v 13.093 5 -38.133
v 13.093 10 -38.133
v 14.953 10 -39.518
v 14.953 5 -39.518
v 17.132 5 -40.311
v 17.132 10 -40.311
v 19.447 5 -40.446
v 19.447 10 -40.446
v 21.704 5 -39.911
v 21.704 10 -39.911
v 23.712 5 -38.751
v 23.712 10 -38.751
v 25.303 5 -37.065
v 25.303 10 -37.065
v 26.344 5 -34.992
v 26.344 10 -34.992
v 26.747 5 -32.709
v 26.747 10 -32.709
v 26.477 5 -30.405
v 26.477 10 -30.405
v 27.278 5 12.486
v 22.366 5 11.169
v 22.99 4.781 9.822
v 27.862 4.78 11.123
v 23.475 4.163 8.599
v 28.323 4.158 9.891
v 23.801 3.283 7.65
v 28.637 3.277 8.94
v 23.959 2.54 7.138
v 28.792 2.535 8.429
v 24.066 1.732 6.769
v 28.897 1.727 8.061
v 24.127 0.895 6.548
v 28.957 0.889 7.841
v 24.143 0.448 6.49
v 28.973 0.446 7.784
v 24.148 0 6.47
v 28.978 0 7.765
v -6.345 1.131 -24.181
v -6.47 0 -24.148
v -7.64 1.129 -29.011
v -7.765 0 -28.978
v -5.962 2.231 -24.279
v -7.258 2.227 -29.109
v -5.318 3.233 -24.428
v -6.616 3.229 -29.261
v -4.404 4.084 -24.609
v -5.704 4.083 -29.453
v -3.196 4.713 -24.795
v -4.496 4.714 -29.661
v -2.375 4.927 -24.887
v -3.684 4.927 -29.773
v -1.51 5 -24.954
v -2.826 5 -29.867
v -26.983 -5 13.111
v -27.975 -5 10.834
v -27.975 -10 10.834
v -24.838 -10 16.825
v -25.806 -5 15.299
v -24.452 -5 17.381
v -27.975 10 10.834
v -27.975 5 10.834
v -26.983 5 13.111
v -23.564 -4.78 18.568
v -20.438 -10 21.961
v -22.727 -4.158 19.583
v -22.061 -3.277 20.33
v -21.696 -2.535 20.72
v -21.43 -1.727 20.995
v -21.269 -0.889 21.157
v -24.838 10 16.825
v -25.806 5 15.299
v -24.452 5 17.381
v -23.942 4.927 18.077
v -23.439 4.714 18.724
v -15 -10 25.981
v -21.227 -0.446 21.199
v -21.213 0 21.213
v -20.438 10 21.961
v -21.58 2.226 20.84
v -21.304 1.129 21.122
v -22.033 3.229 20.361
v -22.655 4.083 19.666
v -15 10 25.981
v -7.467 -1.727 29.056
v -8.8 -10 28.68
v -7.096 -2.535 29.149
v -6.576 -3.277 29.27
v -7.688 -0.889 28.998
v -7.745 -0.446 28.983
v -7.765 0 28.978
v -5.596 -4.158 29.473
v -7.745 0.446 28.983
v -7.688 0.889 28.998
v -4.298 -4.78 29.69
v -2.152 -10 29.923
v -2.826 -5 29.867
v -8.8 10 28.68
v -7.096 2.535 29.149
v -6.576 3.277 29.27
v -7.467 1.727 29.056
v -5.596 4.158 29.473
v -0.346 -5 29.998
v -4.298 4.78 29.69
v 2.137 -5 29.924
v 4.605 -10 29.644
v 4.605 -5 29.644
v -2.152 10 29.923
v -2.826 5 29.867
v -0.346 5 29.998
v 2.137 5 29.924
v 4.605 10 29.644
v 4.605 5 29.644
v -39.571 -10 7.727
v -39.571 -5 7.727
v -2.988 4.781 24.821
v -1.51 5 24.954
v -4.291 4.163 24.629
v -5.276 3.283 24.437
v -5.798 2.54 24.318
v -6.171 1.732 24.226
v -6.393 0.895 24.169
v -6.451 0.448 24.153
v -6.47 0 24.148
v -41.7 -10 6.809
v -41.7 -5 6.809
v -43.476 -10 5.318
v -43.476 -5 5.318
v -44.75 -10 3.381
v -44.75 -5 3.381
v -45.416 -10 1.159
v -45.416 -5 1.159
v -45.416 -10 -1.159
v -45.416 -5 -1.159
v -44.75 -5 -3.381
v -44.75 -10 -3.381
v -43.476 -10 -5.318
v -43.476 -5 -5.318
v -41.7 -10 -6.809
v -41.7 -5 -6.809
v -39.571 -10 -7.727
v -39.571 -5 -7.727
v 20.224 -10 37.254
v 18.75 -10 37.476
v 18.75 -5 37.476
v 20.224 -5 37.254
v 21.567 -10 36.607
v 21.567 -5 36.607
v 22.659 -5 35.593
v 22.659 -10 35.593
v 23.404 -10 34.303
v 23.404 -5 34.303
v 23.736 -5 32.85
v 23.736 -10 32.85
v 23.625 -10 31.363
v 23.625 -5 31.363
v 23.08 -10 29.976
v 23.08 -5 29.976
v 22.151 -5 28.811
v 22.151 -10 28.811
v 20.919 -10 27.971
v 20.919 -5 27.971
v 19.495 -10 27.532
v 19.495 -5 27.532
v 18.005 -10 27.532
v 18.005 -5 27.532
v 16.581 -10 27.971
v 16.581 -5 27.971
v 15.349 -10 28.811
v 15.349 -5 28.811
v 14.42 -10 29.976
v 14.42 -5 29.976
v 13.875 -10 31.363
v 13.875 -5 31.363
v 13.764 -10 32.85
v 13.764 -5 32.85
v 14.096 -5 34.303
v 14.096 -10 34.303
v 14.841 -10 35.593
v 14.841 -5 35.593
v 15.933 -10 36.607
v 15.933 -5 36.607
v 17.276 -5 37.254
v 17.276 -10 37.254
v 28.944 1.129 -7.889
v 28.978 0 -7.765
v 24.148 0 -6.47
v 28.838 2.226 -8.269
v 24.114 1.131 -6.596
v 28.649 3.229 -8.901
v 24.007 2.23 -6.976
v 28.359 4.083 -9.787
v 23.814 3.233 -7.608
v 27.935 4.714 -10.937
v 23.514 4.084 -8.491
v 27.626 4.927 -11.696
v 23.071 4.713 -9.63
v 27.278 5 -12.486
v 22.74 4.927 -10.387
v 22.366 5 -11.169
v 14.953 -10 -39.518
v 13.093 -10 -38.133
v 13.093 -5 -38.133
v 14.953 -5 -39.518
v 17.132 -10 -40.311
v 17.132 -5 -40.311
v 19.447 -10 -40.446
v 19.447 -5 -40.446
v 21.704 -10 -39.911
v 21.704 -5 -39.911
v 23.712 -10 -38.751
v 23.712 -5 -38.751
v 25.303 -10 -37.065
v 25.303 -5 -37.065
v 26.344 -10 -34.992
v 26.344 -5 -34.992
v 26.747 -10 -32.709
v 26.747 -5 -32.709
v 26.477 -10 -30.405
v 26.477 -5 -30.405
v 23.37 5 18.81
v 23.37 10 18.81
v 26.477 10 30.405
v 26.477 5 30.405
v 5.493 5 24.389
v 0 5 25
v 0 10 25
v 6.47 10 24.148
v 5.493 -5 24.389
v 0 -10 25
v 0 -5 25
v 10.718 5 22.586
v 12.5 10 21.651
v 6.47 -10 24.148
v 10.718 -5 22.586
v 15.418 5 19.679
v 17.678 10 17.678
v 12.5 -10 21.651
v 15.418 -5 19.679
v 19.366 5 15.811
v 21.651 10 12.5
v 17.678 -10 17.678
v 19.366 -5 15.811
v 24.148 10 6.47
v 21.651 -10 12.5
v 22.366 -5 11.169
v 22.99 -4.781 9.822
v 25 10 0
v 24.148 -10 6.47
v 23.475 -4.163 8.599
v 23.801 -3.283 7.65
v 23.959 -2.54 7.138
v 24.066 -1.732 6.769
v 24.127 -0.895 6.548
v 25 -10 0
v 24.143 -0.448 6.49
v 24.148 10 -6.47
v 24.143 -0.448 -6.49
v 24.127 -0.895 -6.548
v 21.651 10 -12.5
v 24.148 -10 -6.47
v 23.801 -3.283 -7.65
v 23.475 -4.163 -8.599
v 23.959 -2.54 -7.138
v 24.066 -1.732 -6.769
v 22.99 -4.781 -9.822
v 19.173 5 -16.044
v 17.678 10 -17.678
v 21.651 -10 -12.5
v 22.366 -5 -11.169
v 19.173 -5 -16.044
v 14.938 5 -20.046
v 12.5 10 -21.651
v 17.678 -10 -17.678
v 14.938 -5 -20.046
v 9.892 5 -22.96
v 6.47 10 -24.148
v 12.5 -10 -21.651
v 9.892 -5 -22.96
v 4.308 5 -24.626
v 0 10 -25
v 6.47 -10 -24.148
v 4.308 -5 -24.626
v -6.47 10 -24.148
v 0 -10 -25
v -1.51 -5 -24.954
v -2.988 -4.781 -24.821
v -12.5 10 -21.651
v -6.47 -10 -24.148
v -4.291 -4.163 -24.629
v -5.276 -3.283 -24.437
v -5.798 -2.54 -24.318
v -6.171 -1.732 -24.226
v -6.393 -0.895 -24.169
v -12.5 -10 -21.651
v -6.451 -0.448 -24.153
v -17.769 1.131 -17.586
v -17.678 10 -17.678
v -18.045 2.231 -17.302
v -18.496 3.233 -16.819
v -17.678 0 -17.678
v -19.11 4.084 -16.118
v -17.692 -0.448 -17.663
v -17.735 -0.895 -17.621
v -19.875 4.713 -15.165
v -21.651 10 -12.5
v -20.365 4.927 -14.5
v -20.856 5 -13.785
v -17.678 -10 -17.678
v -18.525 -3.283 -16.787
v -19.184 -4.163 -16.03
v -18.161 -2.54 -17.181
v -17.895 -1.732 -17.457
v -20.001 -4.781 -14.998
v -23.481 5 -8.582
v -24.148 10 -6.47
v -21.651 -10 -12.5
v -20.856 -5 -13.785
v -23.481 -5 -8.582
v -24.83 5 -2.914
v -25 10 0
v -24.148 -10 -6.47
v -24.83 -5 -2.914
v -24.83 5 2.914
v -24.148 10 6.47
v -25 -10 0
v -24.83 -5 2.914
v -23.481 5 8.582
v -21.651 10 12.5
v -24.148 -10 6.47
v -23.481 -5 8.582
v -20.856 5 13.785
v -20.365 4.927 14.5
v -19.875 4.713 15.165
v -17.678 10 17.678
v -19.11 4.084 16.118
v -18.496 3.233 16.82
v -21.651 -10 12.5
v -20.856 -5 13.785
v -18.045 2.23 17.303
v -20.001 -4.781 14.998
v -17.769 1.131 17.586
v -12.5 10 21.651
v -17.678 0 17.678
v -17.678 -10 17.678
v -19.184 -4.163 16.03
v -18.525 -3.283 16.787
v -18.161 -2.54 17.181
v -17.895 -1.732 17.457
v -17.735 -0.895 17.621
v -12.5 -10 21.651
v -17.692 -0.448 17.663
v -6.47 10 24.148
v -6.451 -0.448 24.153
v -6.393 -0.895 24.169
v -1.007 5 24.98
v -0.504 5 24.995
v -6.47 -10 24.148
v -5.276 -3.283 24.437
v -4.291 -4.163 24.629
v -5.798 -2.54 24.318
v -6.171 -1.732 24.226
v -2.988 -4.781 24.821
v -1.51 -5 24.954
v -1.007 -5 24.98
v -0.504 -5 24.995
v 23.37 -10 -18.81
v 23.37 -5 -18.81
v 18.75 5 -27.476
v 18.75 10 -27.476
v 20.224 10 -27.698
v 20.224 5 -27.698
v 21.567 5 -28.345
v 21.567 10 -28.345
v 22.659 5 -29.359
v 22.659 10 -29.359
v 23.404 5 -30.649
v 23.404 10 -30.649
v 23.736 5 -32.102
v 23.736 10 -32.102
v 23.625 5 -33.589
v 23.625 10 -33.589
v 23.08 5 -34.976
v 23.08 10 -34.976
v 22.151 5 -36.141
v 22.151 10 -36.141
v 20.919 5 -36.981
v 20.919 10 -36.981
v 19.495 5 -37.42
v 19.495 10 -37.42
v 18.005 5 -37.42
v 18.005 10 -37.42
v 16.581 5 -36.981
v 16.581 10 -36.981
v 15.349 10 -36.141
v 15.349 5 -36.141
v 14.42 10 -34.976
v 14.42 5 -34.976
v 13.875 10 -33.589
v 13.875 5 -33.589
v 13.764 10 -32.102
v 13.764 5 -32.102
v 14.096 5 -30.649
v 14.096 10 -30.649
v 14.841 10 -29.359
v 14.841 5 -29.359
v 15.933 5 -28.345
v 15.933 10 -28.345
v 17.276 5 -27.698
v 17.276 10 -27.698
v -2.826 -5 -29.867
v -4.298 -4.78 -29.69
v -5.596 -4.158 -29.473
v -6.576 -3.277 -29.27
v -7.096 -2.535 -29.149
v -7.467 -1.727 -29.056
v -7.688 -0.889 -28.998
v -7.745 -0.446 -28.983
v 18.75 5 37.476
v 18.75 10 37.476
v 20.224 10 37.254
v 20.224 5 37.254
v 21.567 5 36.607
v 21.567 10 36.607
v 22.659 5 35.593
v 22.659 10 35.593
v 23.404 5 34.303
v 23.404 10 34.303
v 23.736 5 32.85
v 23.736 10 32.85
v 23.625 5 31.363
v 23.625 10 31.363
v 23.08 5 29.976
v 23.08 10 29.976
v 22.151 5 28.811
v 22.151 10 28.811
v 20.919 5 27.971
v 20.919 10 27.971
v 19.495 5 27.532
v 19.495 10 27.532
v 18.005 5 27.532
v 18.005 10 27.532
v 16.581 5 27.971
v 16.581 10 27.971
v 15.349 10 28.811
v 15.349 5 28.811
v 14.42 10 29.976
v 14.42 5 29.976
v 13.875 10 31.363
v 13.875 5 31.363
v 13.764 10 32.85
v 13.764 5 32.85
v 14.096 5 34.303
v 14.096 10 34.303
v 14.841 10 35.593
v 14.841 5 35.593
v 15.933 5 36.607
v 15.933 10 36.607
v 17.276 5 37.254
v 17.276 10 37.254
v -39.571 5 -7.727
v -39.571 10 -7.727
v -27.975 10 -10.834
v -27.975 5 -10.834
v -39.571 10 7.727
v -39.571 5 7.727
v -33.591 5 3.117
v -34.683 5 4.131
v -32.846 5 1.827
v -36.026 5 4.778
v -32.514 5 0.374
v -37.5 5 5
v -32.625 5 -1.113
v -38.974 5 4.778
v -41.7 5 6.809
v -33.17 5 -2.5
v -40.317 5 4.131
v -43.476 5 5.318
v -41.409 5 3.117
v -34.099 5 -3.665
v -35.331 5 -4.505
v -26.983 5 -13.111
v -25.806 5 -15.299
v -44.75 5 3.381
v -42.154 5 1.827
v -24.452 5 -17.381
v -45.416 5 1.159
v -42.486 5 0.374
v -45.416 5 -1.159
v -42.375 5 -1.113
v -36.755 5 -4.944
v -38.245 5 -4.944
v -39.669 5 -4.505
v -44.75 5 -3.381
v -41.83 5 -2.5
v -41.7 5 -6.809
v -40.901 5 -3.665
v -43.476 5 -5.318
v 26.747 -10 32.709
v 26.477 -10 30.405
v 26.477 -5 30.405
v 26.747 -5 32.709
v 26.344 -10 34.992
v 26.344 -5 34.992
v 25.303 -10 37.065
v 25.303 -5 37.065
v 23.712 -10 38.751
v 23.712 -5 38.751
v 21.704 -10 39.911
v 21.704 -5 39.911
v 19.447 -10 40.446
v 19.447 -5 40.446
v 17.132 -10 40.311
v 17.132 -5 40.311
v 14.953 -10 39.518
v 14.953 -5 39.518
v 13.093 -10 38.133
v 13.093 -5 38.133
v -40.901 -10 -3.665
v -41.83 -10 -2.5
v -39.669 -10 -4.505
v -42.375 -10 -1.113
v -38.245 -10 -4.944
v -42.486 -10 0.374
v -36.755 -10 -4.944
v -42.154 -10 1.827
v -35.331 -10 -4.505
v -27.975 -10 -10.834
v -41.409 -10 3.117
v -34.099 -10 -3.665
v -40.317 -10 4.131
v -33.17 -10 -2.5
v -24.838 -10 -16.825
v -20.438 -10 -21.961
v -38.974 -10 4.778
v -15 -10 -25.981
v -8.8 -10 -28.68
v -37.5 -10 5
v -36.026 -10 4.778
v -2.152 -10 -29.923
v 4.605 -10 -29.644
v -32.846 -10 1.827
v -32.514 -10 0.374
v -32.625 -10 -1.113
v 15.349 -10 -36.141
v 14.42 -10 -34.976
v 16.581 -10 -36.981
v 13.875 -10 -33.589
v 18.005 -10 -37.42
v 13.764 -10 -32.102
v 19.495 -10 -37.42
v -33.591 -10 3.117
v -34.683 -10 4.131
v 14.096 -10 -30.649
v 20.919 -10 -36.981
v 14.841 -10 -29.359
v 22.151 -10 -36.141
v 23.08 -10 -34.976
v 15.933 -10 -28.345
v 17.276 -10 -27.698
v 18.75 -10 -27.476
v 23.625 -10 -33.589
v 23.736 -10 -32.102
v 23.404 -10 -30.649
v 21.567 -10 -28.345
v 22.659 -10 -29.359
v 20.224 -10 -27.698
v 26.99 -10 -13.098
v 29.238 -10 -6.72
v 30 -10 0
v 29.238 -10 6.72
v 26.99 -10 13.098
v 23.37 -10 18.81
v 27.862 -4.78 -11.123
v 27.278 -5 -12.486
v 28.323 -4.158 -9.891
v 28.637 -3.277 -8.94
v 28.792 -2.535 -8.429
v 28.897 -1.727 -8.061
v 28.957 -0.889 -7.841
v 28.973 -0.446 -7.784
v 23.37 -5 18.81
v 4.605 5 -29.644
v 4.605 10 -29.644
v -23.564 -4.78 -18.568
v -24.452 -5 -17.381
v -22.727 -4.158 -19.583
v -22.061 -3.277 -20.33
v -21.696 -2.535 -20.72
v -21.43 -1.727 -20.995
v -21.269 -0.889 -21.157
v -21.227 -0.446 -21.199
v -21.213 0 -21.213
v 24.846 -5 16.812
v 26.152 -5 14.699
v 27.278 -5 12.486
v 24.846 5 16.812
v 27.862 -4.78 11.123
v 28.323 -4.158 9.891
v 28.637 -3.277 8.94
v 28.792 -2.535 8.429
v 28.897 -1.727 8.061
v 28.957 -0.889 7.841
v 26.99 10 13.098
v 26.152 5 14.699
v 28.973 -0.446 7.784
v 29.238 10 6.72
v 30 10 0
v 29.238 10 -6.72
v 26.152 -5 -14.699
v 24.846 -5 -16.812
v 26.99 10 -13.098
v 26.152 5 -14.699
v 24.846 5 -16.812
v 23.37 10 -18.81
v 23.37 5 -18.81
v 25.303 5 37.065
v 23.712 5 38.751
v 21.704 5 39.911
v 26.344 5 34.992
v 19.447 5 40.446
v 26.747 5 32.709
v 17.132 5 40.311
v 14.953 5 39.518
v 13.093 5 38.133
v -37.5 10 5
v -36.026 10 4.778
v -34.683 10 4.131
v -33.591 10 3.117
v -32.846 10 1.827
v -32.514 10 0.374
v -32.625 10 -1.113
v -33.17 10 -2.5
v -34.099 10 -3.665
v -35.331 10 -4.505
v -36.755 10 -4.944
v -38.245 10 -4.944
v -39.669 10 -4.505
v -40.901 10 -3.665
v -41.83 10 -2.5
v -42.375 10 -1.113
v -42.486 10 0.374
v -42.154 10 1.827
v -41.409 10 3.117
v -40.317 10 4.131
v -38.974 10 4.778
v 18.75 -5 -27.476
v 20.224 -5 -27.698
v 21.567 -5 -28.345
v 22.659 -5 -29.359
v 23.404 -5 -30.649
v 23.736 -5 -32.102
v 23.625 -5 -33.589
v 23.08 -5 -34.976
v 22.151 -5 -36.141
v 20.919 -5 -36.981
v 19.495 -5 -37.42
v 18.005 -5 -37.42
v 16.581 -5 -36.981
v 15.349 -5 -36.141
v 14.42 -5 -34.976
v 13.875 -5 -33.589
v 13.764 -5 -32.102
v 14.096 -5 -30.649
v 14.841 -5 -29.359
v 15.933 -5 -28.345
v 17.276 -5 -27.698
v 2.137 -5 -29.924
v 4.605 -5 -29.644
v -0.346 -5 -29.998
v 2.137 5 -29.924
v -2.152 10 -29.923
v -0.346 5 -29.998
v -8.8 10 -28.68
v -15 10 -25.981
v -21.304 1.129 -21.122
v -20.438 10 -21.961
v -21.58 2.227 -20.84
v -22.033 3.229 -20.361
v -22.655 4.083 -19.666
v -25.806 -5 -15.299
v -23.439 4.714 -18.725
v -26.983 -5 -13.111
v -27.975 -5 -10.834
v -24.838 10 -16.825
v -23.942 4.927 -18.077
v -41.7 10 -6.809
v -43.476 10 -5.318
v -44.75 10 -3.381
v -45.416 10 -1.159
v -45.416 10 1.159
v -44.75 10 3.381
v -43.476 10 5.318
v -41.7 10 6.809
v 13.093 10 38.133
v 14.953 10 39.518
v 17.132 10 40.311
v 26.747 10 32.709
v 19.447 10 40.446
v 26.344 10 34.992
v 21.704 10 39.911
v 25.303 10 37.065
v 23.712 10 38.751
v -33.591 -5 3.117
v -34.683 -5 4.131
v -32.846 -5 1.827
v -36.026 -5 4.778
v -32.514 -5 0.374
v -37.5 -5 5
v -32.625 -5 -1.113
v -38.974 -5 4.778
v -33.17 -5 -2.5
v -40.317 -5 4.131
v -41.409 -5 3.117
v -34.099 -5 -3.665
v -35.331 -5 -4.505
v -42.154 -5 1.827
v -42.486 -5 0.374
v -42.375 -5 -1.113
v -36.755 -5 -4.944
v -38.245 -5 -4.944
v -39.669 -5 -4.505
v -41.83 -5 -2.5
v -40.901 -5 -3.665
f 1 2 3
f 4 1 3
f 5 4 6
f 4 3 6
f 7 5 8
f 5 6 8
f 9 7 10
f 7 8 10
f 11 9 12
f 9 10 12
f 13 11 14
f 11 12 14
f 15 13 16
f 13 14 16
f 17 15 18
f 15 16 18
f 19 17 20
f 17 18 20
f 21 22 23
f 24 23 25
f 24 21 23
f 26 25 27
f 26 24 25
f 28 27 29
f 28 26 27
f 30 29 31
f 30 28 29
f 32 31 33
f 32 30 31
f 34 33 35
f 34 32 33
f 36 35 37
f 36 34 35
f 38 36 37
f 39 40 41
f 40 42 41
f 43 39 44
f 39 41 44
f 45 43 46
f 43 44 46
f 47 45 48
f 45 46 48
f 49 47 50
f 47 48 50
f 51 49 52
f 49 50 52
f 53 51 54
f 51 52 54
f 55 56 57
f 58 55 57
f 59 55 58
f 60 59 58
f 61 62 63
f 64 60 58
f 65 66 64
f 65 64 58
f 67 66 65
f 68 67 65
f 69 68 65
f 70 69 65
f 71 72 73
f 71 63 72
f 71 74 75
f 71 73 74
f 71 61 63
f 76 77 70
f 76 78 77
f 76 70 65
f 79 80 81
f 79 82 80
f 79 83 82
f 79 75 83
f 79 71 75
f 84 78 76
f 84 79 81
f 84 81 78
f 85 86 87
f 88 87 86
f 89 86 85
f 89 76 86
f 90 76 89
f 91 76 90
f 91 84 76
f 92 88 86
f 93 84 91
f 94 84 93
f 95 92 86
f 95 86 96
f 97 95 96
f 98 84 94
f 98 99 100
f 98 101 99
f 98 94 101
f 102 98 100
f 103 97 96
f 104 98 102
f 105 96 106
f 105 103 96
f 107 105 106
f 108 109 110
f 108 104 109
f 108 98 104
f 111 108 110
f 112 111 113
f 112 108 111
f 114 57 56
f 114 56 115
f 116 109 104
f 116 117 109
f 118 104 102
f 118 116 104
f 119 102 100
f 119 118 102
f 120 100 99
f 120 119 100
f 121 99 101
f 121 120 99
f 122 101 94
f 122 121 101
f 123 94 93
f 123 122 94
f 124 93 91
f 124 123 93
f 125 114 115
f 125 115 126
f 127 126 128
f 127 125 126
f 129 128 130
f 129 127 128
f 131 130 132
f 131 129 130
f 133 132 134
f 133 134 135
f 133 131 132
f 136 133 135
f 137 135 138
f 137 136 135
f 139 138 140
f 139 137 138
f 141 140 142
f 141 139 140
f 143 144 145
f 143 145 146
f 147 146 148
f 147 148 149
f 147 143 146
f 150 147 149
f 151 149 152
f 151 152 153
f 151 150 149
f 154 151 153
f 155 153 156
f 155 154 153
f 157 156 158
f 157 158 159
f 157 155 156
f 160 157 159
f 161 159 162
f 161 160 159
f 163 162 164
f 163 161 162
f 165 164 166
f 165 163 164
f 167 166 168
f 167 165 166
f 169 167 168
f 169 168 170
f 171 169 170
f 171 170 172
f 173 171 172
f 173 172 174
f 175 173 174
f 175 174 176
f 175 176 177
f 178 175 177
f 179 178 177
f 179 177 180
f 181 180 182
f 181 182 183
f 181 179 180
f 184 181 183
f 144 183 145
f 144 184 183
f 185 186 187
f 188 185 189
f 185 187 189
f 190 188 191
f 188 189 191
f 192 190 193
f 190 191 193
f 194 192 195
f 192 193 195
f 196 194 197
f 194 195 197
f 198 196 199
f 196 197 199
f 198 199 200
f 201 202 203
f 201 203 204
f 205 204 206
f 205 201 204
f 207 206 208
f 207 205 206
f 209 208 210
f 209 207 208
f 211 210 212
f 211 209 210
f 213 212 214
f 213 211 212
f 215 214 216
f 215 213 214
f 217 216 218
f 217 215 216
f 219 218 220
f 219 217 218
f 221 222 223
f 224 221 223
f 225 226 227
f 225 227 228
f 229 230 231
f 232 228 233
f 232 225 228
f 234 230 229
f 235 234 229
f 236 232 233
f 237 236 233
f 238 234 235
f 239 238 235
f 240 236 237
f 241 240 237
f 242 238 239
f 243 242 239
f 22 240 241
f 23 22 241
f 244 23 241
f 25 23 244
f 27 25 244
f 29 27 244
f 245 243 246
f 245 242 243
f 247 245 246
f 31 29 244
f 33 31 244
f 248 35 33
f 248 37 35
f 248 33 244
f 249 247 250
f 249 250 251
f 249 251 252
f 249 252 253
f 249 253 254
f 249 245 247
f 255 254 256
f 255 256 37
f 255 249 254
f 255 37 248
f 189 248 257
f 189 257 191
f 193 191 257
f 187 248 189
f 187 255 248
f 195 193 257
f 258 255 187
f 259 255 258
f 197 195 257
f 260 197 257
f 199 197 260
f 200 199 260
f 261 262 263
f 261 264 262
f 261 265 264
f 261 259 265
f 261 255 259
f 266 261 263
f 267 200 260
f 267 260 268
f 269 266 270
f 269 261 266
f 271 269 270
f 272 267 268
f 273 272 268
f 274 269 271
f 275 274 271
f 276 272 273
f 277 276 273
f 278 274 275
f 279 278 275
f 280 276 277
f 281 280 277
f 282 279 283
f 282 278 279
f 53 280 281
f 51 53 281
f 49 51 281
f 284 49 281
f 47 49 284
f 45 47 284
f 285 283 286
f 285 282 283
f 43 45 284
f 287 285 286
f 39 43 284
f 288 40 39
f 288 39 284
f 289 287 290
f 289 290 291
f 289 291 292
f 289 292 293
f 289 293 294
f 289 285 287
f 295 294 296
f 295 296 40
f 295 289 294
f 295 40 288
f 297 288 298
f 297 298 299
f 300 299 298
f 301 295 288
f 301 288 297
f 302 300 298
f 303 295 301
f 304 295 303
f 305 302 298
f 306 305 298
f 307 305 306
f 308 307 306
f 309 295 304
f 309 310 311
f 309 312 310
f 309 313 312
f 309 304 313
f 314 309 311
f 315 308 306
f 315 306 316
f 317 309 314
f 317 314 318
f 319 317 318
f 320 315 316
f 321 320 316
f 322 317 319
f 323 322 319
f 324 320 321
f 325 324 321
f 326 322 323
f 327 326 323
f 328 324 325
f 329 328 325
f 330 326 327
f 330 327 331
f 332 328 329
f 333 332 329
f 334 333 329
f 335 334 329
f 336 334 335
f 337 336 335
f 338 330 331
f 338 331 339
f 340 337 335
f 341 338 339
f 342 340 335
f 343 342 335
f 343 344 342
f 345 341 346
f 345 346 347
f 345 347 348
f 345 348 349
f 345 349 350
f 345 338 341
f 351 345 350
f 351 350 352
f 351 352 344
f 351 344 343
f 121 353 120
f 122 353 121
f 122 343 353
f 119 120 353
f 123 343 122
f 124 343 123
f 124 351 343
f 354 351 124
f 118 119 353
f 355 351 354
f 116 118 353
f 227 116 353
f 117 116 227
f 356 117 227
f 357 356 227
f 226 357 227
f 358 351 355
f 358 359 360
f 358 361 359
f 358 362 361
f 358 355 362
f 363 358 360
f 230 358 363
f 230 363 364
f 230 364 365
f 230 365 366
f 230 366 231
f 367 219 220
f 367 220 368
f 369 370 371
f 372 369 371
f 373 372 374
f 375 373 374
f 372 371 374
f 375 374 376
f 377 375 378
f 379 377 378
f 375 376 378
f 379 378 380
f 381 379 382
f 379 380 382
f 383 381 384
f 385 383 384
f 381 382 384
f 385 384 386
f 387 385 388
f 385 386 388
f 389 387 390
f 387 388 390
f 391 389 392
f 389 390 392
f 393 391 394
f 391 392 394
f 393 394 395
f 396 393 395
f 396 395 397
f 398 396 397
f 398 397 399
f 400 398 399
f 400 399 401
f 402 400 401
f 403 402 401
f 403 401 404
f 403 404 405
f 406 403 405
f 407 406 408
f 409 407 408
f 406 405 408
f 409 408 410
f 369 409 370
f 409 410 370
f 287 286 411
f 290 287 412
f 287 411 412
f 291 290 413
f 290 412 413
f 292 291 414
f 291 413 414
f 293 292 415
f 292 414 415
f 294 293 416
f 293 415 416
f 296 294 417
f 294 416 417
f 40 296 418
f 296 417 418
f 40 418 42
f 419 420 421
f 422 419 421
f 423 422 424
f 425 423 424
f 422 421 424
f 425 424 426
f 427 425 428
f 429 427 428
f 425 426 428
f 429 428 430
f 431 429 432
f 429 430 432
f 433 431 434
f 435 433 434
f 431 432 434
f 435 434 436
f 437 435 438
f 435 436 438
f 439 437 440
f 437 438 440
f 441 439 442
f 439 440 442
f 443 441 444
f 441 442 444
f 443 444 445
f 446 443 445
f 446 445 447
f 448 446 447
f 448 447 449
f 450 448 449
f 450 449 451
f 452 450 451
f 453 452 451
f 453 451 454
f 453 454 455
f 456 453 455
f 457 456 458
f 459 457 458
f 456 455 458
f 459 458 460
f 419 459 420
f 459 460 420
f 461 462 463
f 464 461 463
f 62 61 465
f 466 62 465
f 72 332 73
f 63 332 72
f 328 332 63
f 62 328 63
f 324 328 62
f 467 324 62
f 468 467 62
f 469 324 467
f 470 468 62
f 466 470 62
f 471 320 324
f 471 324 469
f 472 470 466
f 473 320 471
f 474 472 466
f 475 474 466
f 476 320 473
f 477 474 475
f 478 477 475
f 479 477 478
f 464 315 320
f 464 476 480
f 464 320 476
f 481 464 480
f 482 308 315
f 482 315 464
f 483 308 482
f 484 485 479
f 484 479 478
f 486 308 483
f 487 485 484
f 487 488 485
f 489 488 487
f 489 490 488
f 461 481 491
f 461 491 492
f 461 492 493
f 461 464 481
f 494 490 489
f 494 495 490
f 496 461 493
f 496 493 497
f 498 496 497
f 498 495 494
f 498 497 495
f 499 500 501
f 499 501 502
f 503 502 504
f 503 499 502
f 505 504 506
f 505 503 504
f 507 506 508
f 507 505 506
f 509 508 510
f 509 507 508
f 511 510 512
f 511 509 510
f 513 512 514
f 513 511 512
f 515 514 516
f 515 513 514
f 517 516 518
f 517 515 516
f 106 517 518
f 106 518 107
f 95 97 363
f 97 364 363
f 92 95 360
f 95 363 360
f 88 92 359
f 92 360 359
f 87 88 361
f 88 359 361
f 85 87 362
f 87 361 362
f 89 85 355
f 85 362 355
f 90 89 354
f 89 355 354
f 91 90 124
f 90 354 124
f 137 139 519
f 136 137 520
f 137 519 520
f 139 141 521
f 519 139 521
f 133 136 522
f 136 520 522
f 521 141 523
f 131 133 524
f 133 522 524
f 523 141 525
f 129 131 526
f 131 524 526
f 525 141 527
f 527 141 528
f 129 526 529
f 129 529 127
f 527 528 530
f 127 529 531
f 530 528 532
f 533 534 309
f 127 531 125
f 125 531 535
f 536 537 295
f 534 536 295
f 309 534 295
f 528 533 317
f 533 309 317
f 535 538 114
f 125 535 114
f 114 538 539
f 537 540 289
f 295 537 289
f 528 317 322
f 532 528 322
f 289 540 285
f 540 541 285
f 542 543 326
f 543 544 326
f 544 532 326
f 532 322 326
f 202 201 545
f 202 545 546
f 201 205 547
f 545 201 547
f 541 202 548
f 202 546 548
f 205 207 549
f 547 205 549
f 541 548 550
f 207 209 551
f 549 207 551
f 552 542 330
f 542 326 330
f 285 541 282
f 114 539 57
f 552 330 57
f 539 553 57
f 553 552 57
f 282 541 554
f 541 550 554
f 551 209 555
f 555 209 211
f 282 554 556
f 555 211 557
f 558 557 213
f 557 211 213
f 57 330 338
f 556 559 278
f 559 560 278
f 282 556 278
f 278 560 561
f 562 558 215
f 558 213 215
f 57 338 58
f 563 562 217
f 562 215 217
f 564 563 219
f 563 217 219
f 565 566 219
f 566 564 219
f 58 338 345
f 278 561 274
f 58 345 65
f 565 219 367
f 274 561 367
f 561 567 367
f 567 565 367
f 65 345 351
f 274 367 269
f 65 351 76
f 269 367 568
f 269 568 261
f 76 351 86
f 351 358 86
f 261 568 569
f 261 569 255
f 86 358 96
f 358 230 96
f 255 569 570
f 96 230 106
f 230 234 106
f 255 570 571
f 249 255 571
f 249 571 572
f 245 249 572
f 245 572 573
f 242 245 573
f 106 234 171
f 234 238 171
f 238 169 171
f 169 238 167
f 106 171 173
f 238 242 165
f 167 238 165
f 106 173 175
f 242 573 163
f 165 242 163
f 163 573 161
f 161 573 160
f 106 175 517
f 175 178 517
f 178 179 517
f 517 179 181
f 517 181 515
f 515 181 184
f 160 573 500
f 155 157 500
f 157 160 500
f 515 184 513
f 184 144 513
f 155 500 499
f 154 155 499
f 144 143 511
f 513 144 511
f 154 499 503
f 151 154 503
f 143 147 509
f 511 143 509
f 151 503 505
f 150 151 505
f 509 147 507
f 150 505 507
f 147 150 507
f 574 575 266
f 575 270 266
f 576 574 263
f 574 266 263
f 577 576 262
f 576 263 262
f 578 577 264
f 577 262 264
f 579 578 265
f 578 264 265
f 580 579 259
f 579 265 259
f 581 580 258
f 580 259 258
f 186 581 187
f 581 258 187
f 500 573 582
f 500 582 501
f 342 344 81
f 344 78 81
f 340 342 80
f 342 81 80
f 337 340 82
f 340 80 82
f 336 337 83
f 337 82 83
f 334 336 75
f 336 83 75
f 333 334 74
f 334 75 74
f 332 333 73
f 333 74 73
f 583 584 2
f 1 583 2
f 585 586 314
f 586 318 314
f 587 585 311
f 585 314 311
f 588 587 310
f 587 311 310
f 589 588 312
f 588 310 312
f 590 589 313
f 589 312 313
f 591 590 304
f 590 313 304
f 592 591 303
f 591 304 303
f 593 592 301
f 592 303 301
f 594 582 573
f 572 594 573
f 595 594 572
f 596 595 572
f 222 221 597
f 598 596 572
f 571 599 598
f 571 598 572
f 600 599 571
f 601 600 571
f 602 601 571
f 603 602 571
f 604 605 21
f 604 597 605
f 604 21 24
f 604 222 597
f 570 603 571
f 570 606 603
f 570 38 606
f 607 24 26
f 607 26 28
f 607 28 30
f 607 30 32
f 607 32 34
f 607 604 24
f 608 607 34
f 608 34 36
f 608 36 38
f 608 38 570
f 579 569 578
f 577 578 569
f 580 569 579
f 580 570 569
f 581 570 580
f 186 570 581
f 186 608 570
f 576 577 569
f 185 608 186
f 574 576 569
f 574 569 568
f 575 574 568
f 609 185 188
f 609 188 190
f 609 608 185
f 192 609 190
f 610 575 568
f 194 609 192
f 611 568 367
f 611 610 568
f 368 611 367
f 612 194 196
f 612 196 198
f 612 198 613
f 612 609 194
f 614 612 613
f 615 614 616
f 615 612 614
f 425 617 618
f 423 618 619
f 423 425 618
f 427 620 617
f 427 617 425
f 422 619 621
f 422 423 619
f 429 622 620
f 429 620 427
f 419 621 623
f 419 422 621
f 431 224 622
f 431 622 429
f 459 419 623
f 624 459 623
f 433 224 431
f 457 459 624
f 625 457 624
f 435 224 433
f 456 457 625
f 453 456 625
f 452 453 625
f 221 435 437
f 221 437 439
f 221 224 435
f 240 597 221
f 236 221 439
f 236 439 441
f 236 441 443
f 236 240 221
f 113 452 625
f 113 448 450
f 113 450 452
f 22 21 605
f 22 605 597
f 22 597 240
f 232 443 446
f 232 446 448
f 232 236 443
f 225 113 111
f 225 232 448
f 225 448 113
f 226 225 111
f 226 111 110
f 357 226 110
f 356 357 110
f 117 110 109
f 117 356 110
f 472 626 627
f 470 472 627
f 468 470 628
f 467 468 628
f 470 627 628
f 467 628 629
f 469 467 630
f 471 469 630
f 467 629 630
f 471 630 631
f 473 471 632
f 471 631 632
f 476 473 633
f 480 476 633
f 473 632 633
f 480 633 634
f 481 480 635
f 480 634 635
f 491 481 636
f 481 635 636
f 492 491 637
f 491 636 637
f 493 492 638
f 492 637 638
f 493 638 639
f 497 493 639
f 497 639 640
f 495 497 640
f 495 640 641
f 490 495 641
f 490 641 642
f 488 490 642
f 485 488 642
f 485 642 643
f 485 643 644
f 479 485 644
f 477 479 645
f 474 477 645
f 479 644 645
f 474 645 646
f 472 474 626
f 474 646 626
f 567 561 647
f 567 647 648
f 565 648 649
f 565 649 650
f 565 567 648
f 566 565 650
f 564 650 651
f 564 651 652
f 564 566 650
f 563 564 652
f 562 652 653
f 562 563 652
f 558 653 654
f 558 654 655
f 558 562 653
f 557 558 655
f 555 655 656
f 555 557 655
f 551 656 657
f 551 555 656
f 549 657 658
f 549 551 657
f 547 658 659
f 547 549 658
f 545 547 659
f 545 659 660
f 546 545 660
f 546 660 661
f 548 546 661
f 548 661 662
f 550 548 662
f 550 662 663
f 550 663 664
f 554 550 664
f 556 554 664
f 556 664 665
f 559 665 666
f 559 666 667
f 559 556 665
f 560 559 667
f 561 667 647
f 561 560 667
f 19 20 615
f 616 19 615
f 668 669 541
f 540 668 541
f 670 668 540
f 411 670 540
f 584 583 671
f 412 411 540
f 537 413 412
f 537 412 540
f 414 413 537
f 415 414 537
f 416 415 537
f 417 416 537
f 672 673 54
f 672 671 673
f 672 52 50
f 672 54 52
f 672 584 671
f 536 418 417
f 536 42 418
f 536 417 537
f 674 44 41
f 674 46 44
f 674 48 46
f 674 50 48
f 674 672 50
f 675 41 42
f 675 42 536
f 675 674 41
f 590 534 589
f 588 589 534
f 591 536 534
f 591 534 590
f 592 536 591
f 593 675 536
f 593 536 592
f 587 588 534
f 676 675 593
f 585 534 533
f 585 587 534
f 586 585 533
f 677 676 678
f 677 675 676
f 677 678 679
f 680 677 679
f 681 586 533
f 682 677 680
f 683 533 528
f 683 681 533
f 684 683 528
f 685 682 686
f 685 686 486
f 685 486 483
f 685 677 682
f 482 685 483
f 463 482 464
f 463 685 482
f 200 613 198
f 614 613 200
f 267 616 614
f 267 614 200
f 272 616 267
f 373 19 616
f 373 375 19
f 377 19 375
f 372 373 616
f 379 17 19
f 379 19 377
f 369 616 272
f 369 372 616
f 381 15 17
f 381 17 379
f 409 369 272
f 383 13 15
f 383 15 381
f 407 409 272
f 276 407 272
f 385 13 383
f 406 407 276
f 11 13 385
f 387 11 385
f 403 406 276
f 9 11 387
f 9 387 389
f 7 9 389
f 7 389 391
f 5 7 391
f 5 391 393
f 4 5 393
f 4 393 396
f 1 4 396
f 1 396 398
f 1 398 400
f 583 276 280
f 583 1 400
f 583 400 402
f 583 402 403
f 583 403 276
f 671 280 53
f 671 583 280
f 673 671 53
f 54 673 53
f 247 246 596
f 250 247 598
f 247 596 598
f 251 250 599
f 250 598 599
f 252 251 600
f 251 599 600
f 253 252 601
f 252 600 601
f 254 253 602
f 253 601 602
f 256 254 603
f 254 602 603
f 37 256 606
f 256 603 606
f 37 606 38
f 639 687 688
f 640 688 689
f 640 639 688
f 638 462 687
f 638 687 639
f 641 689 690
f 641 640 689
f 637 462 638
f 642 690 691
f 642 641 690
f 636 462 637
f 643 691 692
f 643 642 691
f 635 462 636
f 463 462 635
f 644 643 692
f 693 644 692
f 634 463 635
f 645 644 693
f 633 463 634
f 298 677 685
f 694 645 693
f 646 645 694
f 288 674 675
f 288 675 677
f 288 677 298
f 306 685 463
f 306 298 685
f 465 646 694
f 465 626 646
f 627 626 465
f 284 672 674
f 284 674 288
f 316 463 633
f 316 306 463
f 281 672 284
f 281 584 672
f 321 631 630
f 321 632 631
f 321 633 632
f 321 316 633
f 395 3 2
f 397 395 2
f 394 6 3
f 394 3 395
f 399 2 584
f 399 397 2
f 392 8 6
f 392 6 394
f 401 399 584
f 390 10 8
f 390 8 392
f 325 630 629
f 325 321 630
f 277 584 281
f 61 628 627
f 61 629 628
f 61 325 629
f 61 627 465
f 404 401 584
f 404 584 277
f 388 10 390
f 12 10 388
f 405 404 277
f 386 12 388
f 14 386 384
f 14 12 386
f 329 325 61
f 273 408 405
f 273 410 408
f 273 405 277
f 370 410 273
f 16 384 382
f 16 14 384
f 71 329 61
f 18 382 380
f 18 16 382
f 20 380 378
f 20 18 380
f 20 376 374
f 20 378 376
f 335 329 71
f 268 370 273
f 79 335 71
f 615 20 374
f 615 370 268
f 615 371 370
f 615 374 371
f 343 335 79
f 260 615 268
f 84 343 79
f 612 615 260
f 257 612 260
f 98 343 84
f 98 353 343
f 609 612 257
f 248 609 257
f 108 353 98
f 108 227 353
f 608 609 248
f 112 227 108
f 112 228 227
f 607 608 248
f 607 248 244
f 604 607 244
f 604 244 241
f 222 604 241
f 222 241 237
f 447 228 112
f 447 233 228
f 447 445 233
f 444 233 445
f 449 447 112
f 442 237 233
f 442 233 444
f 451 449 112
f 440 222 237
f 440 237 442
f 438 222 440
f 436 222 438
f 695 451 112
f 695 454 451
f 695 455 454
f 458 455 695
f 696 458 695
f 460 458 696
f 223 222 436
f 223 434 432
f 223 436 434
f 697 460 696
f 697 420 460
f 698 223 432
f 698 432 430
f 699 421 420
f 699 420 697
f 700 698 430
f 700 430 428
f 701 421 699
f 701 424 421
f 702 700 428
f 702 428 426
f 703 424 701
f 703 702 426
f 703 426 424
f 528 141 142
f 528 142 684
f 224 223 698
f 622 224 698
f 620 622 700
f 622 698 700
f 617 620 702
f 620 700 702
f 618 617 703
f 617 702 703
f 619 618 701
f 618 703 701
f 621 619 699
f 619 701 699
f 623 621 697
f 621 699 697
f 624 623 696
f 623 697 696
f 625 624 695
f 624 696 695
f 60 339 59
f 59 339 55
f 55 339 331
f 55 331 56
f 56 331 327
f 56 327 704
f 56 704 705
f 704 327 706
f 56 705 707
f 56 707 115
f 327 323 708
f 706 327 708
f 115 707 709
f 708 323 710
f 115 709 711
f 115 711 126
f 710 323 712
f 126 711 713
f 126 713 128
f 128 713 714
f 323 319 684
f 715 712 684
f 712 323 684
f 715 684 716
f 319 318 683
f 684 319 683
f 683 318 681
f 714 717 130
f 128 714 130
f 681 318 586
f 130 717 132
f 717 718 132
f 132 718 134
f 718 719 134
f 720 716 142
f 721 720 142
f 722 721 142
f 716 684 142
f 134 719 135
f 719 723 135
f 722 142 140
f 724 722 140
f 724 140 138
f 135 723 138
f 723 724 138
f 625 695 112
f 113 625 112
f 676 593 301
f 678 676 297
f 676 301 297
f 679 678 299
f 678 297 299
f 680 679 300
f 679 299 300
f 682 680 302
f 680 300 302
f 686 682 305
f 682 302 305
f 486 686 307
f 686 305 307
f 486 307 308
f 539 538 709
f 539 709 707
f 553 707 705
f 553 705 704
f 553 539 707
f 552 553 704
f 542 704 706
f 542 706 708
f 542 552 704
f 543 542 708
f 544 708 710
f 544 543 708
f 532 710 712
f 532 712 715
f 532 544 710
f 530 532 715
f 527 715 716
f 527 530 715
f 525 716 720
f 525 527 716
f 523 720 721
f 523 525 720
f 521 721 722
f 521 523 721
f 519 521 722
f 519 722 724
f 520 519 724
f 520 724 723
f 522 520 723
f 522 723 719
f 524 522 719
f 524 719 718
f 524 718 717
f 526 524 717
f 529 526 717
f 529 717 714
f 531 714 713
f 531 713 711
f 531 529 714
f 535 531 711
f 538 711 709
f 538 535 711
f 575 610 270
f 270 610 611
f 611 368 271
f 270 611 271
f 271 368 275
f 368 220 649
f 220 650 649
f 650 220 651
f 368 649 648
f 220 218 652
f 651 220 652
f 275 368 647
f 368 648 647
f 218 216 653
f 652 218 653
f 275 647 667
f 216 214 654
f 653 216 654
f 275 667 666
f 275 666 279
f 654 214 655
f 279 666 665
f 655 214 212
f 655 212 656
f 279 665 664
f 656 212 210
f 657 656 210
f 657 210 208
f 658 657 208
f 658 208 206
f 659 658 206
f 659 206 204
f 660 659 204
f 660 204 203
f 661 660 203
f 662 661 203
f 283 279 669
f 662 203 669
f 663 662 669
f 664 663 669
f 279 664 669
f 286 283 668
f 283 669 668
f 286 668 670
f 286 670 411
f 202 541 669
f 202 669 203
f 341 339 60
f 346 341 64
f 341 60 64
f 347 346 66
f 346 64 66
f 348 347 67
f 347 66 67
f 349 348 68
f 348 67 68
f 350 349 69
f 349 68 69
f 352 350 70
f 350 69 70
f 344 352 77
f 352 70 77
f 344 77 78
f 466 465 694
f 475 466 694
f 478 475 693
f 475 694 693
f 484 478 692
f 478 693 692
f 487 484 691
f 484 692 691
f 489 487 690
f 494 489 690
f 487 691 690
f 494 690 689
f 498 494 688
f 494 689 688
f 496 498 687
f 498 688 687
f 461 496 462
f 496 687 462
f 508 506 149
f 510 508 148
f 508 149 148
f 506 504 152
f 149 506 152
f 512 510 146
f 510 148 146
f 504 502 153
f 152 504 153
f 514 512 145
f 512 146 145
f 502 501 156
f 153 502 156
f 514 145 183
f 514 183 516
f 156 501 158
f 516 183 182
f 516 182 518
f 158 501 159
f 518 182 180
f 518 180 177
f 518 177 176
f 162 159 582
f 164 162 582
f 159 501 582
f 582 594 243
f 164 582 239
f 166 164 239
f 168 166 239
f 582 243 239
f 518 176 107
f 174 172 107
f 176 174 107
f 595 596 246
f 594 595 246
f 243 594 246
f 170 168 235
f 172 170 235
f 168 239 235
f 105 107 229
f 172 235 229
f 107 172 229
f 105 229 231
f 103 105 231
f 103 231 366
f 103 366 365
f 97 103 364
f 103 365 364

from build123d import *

# Parameters (mm, degrees)
SKETCH1_R           = 30
SKETCH1_R_2         = 25
BOSS_EXTRUDE1_DEPTH = 10
SKETCH3_R           = 5
BOSS_EXTRUDE2_DEPTH = 5
CUT_EXTRUDE1_DEPTH  = 5
FILLET3_R           = 5
FILLET4_R           = 5
FILLET5_R           = 5
FILLET6_R           = 5
FILLET7_R           = 5
FILLET8_R           = 5


with BuildPart() as part:
    # Sketch1 → Boss-Extrude1 (new, symmetric)
    with BuildSketch(Plane(origin=(0, 0, 0), x_dir=(1, 0, 0), z_dir=(0, 1, 0))):
        with Locations(Location((0, 0, 0), (0, 0, 270))):
            Circle(SKETCH1_R)
        with Locations(Location((0, 0, 0), (0, 0, 270))):
            Circle(SKETCH1_R_2, mode=Mode.SUBTRACT)
    extrude(amount=BOSS_EXTRUDE1_DEPTH, both=True)

    # Sketch3 → Boss-Extrude2 (add)
    # profile 1 of 3: a face of its own
    with BuildSketch(Plane(origin=(0, 10, 0), x_dir=(1, 0, 0), z_dir=(0, 1, 0))):
        with BuildLine():
            Line((-39.570552361, 7.72740661), (-27.975291142, 10.83434749))
            ThreePointArc((-27.975291142, 10.83434749), (-30, 0), (-27.975291142, -10.83434749))
            Line((-27.975291142, -10.83434749), (-39.570552361, -7.72740661))
            ThreePointArc((-39.570552361, -7.72740661), (-45.5, 0), (-39.570552361, 7.72740661))
        make_face()
        with Locations(Location((-37.5, 0, 0), (0, 0, 270))):
            Circle(SKETCH3_R, mode=Mode.SUBTRACT)
    # profile 2 of 3: a face of its own
    with BuildSketch(Plane(origin=(0, 10, 0), x_dir=(1, 0, 0), z_dir=(0, 1, 0))):
        with BuildLine():
            Line((26.47740661, 30.405400281), (23.370465731, 18.810139062))
            ThreePointArc((23.370465731, 18.810139062), (15, 25.980762114), (4.604825411, 29.644486552))
            Line((4.604825411, 29.644486552), (13.093145751, 38.132806891))
            ThreePointArc((13.093145751, 38.132806891), (22.75, 39.404155872), (26.47740661, 30.405400281))
        make_face()
        with Locations(Location((18.75, 32.475952642, 0), (0, 0, 270))):
            Circle(SKETCH3_R, mode=Mode.SUBTRACT)
    # profile 3 of 3: a face of its own
    with BuildSketch(Plane(origin=(0, 10, 0), x_dir=(1, 0, 0), z_dir=(0, 1, 0))):
        with BuildLine():
            Line((13.093145751, -38.132806891), (4.604825411, -29.644486552))
            ThreePointArc((4.604825411, -29.644486552), (15, -25.980762114), (23.370465731, -18.810139062))
            Line((23.370465731, -18.810139062), (26.47740661, -30.405400281))
            ThreePointArc((26.47740661, -30.405400281), (22.75, -39.404155872), (13.093145751, -38.132806891))
        make_face()
        with Locations(Location((18.75, -32.475952642, 0), (0, 0, 270))):
            Circle(SKETCH3_R, mode=Mode.SUBTRACT)
    boss_extrude2 = extrude(amount=-BOSS_EXTRUDE2_DEPTH)

    # Mirror1: Boss-Extrude2 across plane
    add(boss_extrude2.mirror(Plane.ZX))

    # Sketch4 → Cut-Extrude1 (cut, symmetric)
    with BuildSketch(Plane(origin=(0, 0, 0), x_dir=(1, 0, 0), z_dir=(0, 1, 0))):
        with BuildLine():
            ThreePointArc((-17.67766953, 17.67766953), (-25, 0), (-17.67766953, -17.67766953))
            Line((-17.67766953, -17.67766953), (-21.213203436, -21.213203436))
            ThreePointArc((-21.213203436, -21.213203436), (-30, 0), (-21.213203436, 21.213203436))
            Line((-21.213203436, 21.213203436), (-17.67766953, 17.67766953))
        make_face()
        with BuildLine():
            Line((24.148145657, -6.470476128), (28.977774789, -7.764571353))
            ThreePointArc((28.977774789, -7.764571353), (15, -25.980762114), (-7.764571353, -28.977774789))
            Line((-7.764571353, -28.977774789), (-6.470476128, -24.148145657))
            ThreePointArc((-6.470476128, -24.148145657), (12.5, -21.650635095), (24.148145657, -6.470476128))
        make_face()
        with BuildLine():
            Line((-6.470476128, 24.148145657), (-7.764571353, 28.977774789))
            ThreePointArc((-7.764571353, 28.977774789), (15, 25.980762114), (28.977774789, 7.764571353))
            Line((28.977774789, 7.764571353), (24.148145657, 6.470476128))
            ThreePointArc((24.148145657, 6.470476128), (12.5, 21.650635095), (-6.470476128, 24.148145657))
        make_face()
    extrude(amount=CUT_EXTRUDE1_DEPTH, both=True, mode=Mode.SUBTRACT)

    # Fillet3
    fillet3_edges = [part.edges().sort_by_distance(p)[0] for p in [
        (-19.445436483, -5, -19.445436483),
        (-19.445436483, 5, -19.445436483),
    ]]
    fillet(fillet3_edges, radius=FILLET3_R - 0.0001)  # a hair under: the kernel refuses the full size

    # Fillet4
    fillet4_edges = [part.edges().sort_by_distance(p)[0] for p in [
        (-19.445436483, 5, 19.445436483),
        (-19.445436483, -5, 19.445436483),
    ]]
    fillet(fillet4_edges, radius=FILLET4_R - 0.0001)  # a hair under: the kernel refuses the full size

    # Fillet5
    fillet5_edges = [part.edges().sort_by_distance(p)[0] for p in [
        (-7.11752374, -5, 26.562960223),
        (-7.11752374, 5, 26.562960223),
    ]]
    fillet(fillet5_edges, radius=FILLET5_R - 0.0001)  # a hair under: the kernel refuses the full size

    # Fillet6
    fillet6_edges = [part.edges().sort_by_distance(p)[0] for p in [
        (26.562960223, 5, 7.11752374),
        (26.562960223, -5, 7.11752374),
    ]]
    fillet(fillet6_edges, radius=FILLET6_R - 0.0001)  # a hair under: the kernel refuses the full size

    # Fillet7
    fillet7_edges = [part.edges().sort_by_distance(p)[0] for p in [
        (26.562960223, -5, -7.11752374),
        (26.562960223, 5, -7.11752374),
    ]]
    fillet(fillet7_edges, radius=FILLET7_R - 0.0001)  # a hair under: the kernel refuses the full size

    # Fillet8
    fillet8_edges = [part.edges().sort_by_distance(p)[0] for p in [
        (-7.11752374, 5, -26.562960223),
        (-7.11752374, -5, -26.562960223),
    ]]
    fillet(fillet8_edges, radius=FILLET8_R - 0.0001)  # a hair under: the kernel refuses the full size


solid = part.part
